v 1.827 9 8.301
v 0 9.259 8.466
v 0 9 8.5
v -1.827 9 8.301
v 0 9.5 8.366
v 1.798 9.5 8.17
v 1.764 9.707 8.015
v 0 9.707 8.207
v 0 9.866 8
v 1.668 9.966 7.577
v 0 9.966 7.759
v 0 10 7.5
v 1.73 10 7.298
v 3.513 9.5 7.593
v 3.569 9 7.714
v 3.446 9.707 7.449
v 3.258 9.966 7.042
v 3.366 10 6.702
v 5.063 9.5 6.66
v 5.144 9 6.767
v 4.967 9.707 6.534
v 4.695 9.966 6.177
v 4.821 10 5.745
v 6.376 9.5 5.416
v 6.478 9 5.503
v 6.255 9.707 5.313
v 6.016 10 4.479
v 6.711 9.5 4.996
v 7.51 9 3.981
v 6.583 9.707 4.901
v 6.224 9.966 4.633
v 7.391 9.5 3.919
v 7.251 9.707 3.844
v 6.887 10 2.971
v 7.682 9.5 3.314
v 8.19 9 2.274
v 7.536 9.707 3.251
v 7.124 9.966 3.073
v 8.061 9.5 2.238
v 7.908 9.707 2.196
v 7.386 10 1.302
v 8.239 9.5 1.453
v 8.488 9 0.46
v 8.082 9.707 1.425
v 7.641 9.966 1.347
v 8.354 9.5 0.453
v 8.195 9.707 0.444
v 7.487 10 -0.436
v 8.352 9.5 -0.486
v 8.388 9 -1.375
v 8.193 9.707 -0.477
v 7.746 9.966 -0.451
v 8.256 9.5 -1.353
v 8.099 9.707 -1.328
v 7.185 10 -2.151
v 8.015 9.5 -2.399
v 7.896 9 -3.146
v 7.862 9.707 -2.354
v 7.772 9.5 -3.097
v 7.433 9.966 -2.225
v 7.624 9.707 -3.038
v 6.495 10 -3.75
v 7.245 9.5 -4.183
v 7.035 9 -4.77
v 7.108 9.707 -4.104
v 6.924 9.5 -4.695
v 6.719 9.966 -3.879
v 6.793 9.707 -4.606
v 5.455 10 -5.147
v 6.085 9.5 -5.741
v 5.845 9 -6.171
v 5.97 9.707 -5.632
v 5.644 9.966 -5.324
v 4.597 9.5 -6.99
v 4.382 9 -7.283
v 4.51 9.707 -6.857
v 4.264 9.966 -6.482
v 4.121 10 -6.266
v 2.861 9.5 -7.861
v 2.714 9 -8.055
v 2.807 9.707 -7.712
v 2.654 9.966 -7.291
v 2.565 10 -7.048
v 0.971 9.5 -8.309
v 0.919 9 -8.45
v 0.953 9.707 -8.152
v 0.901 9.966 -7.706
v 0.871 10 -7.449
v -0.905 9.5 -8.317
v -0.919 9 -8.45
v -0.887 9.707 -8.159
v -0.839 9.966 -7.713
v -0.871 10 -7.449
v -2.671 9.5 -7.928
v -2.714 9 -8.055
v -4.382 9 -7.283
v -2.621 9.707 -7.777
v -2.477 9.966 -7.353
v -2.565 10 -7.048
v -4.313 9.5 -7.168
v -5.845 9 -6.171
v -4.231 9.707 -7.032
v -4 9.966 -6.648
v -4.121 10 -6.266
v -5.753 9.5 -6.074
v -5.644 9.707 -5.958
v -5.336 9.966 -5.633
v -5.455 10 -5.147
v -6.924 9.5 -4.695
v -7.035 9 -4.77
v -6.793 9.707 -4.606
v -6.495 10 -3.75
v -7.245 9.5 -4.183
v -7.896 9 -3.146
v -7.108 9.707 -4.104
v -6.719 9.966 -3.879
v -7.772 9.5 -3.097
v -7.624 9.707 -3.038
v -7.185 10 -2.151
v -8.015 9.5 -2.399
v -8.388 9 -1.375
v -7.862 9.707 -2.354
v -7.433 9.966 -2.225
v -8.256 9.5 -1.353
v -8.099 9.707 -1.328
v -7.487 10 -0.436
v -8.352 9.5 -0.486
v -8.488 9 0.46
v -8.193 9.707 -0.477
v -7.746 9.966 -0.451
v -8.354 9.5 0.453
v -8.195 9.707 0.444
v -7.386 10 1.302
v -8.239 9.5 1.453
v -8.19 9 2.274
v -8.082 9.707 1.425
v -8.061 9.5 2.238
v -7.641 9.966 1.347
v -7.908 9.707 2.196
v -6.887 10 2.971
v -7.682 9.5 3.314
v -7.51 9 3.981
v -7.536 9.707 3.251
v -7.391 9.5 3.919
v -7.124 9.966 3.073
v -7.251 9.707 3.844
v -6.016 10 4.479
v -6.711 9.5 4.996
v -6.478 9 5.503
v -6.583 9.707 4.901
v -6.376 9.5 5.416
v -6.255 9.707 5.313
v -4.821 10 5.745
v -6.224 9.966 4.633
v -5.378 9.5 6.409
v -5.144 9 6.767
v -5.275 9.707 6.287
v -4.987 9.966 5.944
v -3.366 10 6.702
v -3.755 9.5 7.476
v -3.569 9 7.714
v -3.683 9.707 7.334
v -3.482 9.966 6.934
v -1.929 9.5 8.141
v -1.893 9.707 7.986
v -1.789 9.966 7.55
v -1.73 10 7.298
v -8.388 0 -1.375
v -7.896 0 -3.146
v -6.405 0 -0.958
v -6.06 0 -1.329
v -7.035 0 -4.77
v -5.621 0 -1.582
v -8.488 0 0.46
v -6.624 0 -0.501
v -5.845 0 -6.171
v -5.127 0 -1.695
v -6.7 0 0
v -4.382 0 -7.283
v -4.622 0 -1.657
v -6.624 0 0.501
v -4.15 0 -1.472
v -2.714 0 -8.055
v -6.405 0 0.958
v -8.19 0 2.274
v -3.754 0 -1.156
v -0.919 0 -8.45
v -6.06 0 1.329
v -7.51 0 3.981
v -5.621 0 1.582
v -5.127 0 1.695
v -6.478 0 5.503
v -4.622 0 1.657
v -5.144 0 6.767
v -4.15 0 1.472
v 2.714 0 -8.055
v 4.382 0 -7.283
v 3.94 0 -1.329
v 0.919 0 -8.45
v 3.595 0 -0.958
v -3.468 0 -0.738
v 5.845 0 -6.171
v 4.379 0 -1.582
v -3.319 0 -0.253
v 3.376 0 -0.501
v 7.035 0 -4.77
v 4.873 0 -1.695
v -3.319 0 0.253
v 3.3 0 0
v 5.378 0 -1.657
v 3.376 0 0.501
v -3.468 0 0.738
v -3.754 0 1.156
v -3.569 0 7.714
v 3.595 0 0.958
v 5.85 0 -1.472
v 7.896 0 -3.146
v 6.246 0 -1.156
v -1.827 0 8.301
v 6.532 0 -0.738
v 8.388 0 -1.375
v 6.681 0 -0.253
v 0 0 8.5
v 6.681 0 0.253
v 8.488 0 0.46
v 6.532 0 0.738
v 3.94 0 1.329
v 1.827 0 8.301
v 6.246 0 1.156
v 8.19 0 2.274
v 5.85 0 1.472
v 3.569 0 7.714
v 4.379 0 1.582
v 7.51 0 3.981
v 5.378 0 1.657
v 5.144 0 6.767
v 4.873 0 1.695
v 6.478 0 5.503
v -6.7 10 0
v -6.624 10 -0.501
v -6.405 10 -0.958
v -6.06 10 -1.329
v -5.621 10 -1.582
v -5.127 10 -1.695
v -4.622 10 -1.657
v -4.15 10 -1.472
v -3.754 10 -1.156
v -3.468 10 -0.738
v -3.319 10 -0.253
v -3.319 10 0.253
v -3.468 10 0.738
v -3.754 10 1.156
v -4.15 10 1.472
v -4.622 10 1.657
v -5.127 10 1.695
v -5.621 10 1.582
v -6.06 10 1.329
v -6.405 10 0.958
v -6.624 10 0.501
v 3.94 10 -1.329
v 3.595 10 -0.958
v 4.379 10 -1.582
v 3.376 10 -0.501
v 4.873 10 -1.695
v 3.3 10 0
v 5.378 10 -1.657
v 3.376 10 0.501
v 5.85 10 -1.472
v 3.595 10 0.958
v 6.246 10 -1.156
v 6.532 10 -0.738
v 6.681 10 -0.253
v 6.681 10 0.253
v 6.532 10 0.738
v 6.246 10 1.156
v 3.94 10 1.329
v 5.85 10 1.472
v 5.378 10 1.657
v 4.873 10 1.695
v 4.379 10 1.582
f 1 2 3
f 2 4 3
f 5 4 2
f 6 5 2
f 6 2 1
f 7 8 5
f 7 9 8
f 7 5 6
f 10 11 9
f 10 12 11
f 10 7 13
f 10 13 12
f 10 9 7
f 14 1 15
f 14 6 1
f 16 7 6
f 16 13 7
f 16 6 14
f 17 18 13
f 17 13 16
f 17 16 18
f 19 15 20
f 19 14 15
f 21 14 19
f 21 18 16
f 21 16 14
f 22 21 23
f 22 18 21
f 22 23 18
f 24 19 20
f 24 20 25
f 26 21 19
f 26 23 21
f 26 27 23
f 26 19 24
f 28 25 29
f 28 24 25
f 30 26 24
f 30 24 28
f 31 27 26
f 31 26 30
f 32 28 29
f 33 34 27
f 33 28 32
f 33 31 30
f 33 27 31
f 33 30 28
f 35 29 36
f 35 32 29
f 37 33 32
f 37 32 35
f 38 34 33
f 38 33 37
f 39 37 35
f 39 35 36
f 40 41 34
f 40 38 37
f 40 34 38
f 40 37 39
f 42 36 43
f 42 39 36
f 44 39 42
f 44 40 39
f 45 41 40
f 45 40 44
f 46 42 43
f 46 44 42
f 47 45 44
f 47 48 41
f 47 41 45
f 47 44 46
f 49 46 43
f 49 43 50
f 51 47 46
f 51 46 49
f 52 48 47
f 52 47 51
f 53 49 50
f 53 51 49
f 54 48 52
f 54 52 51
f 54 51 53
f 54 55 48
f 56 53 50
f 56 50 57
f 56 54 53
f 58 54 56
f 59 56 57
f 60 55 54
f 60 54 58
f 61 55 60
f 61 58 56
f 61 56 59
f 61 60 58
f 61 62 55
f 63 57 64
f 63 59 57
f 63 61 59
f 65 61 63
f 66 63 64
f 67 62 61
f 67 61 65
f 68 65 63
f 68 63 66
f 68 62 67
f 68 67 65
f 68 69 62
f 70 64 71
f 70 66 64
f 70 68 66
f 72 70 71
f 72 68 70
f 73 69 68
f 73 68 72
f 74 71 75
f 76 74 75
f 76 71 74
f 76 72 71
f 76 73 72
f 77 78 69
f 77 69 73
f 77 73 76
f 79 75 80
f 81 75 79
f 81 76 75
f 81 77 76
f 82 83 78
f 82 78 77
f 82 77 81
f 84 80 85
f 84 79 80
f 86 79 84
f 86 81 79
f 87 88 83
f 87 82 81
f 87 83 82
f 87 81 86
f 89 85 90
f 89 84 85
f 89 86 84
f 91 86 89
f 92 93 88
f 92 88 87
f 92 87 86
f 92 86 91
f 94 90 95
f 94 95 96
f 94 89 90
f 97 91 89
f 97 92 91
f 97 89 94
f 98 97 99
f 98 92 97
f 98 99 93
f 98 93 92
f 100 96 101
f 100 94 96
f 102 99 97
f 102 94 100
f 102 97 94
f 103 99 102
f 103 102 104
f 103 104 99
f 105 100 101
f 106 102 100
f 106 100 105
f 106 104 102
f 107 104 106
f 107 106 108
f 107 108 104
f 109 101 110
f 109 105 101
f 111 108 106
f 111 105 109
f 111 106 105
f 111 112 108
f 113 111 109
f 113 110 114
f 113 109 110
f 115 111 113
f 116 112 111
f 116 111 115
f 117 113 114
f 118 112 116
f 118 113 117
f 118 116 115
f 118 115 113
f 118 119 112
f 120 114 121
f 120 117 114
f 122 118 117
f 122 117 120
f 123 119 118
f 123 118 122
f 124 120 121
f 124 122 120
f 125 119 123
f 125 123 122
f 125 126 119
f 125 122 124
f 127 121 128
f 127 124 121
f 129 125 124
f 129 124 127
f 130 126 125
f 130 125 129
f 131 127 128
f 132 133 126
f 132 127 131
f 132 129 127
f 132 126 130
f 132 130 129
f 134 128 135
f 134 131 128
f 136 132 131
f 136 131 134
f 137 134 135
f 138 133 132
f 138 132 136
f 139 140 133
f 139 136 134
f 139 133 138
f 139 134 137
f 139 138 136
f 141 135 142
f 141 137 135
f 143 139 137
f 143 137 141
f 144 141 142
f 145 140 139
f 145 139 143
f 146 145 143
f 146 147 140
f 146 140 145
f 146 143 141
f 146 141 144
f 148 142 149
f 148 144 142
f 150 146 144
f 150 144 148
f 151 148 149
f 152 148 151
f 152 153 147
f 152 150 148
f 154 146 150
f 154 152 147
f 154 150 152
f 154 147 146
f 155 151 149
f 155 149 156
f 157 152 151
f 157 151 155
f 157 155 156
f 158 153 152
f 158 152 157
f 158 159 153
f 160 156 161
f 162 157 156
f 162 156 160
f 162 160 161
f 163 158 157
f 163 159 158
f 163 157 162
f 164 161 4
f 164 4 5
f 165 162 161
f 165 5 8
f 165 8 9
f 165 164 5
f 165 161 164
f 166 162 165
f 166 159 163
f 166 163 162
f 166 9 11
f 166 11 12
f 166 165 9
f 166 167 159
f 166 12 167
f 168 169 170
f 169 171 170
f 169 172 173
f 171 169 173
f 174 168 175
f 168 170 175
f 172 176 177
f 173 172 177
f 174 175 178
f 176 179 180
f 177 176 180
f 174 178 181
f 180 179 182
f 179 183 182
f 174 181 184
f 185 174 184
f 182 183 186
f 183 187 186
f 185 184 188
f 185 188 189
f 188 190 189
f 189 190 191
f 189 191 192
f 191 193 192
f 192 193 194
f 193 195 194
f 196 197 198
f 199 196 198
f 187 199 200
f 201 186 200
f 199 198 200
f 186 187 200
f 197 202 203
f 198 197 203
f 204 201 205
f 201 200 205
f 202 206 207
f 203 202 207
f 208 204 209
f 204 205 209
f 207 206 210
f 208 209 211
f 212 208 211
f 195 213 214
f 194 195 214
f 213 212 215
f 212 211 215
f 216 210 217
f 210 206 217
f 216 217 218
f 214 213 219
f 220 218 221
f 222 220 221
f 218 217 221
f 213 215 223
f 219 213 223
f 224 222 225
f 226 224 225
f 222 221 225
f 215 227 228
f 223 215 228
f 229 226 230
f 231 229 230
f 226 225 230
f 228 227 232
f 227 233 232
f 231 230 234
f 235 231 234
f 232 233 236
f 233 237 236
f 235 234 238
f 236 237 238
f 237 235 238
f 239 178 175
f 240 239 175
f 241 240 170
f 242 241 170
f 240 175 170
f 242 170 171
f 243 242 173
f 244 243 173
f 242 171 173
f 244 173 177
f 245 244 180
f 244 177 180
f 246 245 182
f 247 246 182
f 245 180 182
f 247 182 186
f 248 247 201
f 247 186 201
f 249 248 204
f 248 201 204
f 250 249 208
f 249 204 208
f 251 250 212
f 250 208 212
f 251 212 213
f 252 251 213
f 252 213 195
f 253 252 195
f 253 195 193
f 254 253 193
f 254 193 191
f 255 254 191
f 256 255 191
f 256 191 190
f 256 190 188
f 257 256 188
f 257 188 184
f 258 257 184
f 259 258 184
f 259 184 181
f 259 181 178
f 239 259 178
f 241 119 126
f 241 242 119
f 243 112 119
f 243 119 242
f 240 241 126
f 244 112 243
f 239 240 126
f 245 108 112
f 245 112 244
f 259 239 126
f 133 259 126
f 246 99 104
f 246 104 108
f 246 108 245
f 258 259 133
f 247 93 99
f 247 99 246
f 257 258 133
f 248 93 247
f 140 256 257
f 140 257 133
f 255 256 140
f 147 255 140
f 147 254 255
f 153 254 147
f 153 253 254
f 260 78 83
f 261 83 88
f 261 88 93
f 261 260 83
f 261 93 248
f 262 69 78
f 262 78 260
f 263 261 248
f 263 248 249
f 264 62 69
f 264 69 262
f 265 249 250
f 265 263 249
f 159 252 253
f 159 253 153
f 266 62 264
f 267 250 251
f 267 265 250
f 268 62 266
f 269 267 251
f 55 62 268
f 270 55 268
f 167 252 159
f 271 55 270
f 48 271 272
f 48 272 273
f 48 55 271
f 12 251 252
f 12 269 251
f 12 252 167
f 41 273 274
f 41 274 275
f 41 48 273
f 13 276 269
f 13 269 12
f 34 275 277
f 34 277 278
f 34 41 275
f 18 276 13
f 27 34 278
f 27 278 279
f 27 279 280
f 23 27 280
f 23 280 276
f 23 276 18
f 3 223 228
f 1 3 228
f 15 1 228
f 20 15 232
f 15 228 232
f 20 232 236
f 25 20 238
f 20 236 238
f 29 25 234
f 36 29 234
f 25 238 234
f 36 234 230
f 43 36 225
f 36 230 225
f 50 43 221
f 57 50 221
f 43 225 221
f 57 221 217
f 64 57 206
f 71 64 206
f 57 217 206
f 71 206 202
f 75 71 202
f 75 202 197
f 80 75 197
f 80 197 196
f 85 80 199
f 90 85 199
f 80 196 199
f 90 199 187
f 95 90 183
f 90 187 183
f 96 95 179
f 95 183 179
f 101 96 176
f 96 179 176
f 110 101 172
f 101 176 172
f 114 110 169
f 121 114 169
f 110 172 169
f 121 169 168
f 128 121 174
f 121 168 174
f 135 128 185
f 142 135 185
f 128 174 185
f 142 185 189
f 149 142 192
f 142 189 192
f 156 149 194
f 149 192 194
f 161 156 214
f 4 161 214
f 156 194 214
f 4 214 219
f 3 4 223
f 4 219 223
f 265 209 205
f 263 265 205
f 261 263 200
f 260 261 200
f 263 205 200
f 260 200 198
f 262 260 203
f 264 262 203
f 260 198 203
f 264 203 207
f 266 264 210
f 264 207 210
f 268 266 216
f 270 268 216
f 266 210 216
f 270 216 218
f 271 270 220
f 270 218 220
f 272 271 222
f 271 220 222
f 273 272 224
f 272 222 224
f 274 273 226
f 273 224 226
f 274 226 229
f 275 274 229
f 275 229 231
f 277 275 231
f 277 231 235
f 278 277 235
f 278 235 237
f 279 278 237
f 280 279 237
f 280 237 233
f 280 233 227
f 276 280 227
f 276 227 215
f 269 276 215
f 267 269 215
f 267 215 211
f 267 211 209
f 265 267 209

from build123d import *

# Parameters (mm, degrees)
SKETCH1_R            = 8.5
BOSS_EXTRUDE1_DEPTH  = 10
FILLET2_R            = 1
M3_CLEARANCE_HOLE1_D = 3.4


with BuildPart() as part:
    # Sketch1 → Boss-Extrude1 (new body)
    with BuildSketch(Plane(origin=(0, 0, 0), x_dir=(1, 0, 0), z_dir=(0, 1, 0))):
        with Locations(Location((0, 0, 0), (0, 0, 270))):
            Circle(SKETCH1_R)
    extrude(amount=BOSS_EXTRUDE1_DEPTH)

    # Fillet2
    fillet2_edges = [part.edges().sort_by_distance(p)[0] for p in [
        (0, 10, -8.5),
    ]]
    fillet(fillet2_edges, radius=FILLET2_R)

    # M3 Clearance Hole1 (through all)
    with Locations(Plane(origin=(0, 10, 0), x_dir=(1, 0, 0), z_dir=(0, 1, 0))):
        with Locations((-5, 0), (5, 0)):
            Hole(M3_CLEARANCE_HOLE1_D / 2)


solid = part.part
